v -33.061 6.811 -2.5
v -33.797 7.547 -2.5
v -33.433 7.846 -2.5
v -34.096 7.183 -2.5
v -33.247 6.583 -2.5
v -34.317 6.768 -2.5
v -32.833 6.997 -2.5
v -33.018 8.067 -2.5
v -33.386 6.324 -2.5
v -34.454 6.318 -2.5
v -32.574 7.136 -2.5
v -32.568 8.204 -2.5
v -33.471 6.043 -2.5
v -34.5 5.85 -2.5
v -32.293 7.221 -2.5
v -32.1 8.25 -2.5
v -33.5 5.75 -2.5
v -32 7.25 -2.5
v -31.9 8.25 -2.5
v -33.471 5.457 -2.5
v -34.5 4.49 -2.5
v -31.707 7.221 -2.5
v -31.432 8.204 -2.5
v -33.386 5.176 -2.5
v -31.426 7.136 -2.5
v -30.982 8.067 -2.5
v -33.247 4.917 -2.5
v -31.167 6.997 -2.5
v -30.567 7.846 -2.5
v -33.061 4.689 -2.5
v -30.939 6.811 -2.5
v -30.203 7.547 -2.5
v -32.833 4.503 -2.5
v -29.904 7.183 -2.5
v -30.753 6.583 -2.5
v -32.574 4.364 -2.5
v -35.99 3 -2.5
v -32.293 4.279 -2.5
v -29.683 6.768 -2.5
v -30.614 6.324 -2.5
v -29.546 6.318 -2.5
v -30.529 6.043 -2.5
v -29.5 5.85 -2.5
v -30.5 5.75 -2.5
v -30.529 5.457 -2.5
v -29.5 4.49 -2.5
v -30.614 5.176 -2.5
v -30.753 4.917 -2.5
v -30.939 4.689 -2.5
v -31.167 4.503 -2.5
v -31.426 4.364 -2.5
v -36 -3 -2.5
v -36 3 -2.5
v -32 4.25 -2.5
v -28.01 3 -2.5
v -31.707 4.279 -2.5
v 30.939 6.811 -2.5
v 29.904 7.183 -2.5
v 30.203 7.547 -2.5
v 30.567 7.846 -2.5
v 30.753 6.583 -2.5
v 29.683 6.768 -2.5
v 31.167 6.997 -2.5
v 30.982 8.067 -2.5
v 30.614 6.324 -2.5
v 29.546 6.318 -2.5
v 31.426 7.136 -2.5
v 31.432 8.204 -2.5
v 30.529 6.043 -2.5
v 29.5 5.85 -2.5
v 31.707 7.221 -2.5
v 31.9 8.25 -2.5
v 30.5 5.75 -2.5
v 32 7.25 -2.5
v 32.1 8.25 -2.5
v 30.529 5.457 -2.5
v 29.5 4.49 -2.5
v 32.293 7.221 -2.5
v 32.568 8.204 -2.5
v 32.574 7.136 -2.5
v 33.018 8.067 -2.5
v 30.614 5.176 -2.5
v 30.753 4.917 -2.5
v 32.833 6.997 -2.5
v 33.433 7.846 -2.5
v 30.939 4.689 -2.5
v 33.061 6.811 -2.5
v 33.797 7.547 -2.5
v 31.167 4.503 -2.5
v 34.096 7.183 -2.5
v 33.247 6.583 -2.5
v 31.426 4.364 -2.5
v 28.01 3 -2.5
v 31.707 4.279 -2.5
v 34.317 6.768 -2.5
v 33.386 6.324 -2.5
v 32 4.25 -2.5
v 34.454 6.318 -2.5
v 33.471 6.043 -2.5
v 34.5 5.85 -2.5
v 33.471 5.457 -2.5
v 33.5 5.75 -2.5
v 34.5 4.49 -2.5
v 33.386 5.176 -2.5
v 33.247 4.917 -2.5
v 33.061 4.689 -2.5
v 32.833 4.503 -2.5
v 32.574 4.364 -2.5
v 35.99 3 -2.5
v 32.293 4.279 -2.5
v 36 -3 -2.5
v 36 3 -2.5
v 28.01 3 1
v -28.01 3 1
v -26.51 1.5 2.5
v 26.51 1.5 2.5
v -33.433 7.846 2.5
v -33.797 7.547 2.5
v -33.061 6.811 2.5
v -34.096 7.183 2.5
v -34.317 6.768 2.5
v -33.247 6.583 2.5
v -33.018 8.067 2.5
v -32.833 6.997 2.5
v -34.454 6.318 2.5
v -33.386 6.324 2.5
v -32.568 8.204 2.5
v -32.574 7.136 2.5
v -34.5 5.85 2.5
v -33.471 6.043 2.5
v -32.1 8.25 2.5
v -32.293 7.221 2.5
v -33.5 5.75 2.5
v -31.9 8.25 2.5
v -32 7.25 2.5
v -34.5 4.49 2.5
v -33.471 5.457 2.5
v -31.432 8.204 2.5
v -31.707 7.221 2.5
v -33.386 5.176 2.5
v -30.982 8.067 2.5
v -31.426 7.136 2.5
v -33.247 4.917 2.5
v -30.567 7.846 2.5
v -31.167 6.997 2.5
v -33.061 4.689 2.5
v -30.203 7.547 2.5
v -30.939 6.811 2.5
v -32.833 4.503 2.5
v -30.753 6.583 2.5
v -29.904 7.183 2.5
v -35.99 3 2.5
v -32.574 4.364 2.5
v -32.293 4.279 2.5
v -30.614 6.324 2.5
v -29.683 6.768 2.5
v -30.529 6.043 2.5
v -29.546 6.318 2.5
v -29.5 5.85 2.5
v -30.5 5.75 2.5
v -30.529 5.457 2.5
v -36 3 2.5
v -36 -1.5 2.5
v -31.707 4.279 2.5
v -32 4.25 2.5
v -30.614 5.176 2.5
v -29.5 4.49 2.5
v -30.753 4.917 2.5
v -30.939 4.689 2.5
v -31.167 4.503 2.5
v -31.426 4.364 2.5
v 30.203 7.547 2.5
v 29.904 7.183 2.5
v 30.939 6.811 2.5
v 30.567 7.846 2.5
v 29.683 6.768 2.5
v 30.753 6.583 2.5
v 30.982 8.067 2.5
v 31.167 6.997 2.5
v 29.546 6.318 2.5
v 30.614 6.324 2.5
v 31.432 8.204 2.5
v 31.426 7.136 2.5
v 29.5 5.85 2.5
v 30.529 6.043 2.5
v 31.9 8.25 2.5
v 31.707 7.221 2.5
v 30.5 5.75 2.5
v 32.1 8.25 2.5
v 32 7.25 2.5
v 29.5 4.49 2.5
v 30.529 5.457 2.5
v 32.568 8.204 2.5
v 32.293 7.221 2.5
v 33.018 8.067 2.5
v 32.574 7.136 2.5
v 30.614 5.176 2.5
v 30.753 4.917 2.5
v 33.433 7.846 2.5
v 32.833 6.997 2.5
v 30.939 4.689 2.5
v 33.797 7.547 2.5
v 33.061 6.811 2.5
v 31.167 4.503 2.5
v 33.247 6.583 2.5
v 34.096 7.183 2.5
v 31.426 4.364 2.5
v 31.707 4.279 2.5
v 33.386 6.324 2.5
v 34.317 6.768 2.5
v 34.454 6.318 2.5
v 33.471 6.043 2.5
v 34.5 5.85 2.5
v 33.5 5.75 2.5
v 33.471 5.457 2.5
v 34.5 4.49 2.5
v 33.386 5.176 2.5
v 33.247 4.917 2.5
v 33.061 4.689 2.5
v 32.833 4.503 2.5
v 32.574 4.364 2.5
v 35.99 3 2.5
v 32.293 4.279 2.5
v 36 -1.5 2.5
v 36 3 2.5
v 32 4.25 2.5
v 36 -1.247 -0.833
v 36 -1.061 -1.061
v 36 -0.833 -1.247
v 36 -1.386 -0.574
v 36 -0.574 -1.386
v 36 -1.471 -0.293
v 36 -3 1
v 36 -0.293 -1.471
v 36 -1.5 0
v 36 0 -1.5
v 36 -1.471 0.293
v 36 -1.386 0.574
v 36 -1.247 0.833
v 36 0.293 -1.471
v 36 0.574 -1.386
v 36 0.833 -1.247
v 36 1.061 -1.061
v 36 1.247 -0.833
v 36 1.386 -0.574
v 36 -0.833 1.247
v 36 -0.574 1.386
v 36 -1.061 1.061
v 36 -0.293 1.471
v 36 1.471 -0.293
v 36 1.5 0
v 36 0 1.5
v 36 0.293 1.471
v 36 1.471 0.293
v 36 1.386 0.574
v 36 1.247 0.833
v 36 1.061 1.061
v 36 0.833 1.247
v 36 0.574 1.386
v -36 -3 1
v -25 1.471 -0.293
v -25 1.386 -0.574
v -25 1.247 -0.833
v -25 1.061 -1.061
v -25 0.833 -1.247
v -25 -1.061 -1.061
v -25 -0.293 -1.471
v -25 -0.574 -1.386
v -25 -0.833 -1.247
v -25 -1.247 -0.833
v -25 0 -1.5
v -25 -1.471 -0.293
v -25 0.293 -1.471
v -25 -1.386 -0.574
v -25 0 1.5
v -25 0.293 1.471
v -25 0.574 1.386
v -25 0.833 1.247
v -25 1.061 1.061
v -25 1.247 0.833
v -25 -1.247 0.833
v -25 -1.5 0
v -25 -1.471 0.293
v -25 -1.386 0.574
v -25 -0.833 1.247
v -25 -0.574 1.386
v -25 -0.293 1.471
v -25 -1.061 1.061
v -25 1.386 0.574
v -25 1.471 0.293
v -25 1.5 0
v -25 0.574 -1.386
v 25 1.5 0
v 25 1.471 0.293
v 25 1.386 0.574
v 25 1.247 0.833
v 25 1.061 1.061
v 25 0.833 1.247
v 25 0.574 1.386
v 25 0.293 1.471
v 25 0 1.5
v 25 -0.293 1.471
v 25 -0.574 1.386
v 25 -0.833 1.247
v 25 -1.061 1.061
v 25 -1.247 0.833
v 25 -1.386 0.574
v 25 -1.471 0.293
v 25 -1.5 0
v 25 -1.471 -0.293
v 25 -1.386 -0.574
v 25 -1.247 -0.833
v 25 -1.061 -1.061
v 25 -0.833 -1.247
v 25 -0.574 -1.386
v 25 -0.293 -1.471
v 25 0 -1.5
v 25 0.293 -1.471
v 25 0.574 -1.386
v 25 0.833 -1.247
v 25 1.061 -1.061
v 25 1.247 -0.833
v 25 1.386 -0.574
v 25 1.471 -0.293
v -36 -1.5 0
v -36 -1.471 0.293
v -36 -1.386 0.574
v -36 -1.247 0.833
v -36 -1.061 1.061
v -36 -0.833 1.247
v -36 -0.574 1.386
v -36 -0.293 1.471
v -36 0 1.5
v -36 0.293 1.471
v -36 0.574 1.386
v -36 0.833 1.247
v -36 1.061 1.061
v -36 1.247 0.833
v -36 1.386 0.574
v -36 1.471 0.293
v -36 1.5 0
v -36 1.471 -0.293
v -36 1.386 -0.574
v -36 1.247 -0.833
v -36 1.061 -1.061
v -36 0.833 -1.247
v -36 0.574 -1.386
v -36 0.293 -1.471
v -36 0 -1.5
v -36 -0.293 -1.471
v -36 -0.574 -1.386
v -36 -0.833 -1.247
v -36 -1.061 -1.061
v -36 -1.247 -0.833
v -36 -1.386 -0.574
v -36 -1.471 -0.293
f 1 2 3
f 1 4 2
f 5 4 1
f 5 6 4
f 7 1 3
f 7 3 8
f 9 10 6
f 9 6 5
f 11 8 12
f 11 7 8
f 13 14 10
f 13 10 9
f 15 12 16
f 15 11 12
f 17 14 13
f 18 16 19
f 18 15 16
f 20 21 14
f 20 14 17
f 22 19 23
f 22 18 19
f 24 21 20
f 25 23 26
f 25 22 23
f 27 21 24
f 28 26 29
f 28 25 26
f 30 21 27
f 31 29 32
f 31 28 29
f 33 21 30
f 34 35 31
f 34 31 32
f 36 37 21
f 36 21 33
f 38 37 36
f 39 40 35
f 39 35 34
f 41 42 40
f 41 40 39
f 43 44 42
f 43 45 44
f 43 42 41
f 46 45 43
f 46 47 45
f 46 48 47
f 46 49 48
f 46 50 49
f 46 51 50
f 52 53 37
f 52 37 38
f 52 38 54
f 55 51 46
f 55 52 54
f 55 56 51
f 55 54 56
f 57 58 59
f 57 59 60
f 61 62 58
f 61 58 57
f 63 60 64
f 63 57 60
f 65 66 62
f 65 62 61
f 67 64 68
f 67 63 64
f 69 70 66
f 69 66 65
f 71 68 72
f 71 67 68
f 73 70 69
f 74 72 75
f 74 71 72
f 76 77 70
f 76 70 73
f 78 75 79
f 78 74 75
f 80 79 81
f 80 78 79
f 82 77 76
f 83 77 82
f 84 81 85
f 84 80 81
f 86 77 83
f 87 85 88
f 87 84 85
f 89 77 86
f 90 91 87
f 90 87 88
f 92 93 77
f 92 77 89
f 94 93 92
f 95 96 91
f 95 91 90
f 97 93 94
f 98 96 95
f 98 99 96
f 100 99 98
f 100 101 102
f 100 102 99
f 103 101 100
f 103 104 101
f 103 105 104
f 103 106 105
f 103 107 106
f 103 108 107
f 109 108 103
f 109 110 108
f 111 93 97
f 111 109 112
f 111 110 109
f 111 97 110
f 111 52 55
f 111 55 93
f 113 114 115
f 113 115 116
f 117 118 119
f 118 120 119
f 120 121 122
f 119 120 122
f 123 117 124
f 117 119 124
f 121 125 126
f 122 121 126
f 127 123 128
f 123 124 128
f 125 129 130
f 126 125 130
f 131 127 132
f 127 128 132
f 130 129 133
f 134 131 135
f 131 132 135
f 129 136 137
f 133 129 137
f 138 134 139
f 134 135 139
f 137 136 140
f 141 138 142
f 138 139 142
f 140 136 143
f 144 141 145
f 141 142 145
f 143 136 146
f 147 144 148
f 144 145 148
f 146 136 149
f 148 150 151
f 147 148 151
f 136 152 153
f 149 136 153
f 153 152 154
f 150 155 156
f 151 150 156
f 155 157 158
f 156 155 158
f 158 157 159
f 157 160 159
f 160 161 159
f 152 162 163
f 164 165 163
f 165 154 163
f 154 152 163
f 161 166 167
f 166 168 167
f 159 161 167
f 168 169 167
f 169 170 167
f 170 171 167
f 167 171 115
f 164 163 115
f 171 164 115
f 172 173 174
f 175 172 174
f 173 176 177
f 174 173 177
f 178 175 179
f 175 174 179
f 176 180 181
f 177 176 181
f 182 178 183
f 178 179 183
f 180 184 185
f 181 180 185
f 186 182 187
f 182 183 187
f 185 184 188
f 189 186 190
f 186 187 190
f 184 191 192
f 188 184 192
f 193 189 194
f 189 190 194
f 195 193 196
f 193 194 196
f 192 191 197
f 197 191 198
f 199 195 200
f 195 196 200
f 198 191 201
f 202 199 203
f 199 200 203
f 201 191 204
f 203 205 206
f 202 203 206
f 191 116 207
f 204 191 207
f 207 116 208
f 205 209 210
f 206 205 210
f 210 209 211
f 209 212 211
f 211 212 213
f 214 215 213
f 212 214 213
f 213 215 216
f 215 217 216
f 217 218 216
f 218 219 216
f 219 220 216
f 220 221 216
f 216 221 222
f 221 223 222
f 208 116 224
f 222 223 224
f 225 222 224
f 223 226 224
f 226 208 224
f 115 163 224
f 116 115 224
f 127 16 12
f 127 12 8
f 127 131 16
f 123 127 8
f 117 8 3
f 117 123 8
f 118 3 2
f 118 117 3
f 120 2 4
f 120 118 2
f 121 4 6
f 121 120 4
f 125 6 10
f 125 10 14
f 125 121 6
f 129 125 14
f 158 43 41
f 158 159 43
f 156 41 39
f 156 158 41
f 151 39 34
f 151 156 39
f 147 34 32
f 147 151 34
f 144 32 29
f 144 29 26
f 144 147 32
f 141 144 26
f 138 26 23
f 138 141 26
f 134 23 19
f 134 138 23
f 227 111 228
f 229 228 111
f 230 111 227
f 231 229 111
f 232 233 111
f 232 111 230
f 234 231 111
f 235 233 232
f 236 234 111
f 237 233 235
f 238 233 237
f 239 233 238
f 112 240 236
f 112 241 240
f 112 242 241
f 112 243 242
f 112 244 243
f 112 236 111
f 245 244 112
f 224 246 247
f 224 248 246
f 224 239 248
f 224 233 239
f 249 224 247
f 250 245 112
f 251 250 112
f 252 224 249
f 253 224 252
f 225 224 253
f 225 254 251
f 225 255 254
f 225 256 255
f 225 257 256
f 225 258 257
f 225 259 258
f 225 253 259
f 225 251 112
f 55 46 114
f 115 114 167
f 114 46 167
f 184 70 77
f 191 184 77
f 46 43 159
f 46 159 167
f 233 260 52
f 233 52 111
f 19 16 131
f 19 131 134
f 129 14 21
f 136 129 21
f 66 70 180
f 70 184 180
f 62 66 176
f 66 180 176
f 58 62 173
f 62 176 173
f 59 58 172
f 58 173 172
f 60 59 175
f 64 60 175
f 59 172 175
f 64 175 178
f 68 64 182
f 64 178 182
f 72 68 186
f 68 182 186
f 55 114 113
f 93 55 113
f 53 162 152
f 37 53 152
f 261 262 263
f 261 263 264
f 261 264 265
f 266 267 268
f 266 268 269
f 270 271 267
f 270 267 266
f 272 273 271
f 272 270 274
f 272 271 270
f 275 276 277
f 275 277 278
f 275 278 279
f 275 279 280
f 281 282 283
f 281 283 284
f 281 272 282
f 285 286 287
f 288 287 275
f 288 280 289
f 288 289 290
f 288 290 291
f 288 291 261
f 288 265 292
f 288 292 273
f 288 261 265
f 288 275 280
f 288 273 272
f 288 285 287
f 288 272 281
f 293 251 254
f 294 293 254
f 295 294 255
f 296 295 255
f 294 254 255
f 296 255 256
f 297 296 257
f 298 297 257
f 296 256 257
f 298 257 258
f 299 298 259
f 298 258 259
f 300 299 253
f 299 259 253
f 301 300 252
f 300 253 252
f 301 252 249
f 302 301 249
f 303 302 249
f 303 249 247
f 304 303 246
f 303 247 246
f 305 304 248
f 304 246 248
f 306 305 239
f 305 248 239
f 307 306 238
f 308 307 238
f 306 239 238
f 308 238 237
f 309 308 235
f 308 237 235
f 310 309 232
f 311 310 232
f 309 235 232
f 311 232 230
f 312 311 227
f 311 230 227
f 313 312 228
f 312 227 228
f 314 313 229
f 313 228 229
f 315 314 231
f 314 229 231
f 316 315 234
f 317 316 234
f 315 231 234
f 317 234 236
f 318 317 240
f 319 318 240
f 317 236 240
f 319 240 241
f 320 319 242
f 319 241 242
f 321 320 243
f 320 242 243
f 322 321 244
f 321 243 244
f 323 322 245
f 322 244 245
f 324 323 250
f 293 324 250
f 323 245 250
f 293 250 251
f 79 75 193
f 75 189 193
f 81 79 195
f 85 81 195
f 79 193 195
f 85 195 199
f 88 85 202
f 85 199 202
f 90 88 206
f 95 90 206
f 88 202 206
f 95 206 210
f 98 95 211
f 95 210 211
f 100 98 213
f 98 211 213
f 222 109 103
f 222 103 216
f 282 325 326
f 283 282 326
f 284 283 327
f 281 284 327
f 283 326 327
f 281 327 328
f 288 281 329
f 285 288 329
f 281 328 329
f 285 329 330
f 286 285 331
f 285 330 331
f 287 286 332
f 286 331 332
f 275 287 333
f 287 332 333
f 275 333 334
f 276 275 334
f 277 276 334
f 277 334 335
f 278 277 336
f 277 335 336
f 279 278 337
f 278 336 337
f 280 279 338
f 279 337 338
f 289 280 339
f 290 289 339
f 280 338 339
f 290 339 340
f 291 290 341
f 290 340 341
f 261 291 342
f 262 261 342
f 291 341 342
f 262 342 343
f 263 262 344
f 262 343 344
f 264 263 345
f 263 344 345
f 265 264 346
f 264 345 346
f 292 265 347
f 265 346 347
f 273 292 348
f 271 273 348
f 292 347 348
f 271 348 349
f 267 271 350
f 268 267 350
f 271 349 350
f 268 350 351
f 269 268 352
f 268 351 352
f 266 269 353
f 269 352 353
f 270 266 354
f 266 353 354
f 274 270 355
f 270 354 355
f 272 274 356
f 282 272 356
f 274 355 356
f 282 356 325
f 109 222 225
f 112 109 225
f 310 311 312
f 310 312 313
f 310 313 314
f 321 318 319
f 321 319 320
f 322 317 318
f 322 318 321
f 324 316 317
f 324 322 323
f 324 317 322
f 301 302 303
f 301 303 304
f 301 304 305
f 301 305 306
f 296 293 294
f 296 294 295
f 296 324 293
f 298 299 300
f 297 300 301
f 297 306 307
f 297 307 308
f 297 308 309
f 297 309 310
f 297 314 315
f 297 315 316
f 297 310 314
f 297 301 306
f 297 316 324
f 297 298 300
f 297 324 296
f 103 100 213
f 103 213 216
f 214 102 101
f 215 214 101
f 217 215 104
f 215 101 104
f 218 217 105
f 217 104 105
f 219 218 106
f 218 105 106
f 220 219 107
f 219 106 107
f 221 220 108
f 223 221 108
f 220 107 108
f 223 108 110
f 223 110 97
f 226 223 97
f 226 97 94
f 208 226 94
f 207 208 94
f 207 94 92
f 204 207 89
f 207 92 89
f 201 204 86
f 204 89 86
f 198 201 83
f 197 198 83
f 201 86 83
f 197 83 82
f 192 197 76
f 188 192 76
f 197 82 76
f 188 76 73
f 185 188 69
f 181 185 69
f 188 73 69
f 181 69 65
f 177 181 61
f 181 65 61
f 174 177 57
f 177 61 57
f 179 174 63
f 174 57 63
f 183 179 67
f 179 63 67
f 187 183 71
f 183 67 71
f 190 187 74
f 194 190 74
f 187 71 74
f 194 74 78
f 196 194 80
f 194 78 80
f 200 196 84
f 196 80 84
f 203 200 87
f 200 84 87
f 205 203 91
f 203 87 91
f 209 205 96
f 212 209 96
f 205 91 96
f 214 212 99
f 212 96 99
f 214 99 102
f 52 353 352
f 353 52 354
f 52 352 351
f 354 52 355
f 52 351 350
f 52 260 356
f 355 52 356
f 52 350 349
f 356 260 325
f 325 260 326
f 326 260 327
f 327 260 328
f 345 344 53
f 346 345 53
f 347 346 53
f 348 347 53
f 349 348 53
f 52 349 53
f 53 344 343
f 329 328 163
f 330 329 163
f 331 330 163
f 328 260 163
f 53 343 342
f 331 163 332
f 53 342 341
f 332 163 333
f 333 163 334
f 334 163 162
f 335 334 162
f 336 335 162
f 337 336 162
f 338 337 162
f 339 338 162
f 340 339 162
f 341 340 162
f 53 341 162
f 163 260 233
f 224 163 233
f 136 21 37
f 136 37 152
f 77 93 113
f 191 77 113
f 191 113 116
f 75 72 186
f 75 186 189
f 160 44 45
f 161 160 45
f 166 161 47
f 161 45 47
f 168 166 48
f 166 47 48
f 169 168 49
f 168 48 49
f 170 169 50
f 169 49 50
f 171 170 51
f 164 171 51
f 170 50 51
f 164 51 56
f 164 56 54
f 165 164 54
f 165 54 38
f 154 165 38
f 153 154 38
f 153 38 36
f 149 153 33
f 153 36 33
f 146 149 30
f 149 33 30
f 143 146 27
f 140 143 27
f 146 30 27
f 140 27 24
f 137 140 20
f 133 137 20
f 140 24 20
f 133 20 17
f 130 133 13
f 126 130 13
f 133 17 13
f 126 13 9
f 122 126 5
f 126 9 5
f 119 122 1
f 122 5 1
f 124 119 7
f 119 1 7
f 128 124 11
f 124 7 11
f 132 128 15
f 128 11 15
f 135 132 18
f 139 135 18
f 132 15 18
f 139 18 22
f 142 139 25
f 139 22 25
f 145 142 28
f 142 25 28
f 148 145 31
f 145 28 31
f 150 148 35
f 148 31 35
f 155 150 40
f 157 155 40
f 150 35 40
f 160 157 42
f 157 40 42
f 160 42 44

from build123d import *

# Parameters (mm, degrees)
SKETCH_W        = 72
SKETCH_H        = 6
PAD_DEPTH       = 2.5
SKETCH001_R     = 1.5
POCKET_DEPTH    = 11
SKETCH002_R     = 1.5
POCKET001_DEPTH = 11
SKETCH003_W     = 5
SKETCH003_H     = 5.85
SKETCH003_R     = 1.5
PAD001_DEPTH    = 5
CHAMFER_SIZE    = 1.49
FILLET_R        = 2.4
CHAMFER001_SIZE = 1.5


with BuildPart() as part:
    # Sketch → Pad (new body, symmetric)
    with BuildSketch(Plane.XY):
        Rectangle(SKETCH_W, SKETCH_H)
    extrude(amount=PAD_DEPTH, both=True)

    # Sketch001 → Pocket (cut)
    with BuildSketch(Plane(origin=(-36, 0, 0), x_dir=(0, -1, 0), z_dir=(-1, 0, 0))):
        Circle(SKETCH001_R)
    extrude(amount=-POCKET_DEPTH, mode=Mode.SUBTRACT)

    # Sketch002 → Pocket001 (cut)
    with BuildSketch(Plane.YZ.offset(36)):
        Circle(SKETCH002_R)
    extrude(amount=-POCKET001_DEPTH, mode=Mode.SUBTRACT)

    # Sketch003 → Pad001 (new body)
    with BuildSketch(Plane(origin=(0, 0, -2.5), x_dir=(1, 0, 0), z_dir=(0, 0, -1))):
        with Locations((32, -5.325)):
            Rectangle(SKETCH003_W, SKETCH003_H)
        with Locations((32, -5.75)):
            Circle(SKETCH003_R, mode=Mode.SUBTRACT)
        with Locations((-32, -5.325)):
            Rectangle(SKETCH003_W, SKETCH003_H)
        with Locations((-32, -5.75)):
            Circle(SKETCH003_R, mode=Mode.SUBTRACT)
    extrude(amount=-PAD001_DEPTH)

    # Chamfer
    chamfer_edges = [part.edges().sort_by_distance(p)[0] for p in [
        (34.5, 3, 0),
        (29.5, 3, 0),
        (-29.5, 3, 0),
        (-34.5, 3, 0),
    ]]
    chamfer(chamfer_edges, length=CHAMFER_SIZE)

    # Fillet
    fillet_edges = [part.edges().sort_by_distance(p)[0] for p in [
        (34.5, 8.25, 0),
        (29.5, 8.25, 0),
        (-29.5, 8.25, 0),
        (-34.5, 8.25, 0),
    ]]
    fillet(fillet_edges, radius=FILLET_R)

    # Chamfer001
    chamfer001_edges = [part.edges().sort_by_distance(p)[0] for p in [
        (0, -3, 2.5),
        (0, 3, 2.5),
    ]]
    chamfer(chamfer001_edges, length=CHAMFER001_SIZE)


solid = part.part
